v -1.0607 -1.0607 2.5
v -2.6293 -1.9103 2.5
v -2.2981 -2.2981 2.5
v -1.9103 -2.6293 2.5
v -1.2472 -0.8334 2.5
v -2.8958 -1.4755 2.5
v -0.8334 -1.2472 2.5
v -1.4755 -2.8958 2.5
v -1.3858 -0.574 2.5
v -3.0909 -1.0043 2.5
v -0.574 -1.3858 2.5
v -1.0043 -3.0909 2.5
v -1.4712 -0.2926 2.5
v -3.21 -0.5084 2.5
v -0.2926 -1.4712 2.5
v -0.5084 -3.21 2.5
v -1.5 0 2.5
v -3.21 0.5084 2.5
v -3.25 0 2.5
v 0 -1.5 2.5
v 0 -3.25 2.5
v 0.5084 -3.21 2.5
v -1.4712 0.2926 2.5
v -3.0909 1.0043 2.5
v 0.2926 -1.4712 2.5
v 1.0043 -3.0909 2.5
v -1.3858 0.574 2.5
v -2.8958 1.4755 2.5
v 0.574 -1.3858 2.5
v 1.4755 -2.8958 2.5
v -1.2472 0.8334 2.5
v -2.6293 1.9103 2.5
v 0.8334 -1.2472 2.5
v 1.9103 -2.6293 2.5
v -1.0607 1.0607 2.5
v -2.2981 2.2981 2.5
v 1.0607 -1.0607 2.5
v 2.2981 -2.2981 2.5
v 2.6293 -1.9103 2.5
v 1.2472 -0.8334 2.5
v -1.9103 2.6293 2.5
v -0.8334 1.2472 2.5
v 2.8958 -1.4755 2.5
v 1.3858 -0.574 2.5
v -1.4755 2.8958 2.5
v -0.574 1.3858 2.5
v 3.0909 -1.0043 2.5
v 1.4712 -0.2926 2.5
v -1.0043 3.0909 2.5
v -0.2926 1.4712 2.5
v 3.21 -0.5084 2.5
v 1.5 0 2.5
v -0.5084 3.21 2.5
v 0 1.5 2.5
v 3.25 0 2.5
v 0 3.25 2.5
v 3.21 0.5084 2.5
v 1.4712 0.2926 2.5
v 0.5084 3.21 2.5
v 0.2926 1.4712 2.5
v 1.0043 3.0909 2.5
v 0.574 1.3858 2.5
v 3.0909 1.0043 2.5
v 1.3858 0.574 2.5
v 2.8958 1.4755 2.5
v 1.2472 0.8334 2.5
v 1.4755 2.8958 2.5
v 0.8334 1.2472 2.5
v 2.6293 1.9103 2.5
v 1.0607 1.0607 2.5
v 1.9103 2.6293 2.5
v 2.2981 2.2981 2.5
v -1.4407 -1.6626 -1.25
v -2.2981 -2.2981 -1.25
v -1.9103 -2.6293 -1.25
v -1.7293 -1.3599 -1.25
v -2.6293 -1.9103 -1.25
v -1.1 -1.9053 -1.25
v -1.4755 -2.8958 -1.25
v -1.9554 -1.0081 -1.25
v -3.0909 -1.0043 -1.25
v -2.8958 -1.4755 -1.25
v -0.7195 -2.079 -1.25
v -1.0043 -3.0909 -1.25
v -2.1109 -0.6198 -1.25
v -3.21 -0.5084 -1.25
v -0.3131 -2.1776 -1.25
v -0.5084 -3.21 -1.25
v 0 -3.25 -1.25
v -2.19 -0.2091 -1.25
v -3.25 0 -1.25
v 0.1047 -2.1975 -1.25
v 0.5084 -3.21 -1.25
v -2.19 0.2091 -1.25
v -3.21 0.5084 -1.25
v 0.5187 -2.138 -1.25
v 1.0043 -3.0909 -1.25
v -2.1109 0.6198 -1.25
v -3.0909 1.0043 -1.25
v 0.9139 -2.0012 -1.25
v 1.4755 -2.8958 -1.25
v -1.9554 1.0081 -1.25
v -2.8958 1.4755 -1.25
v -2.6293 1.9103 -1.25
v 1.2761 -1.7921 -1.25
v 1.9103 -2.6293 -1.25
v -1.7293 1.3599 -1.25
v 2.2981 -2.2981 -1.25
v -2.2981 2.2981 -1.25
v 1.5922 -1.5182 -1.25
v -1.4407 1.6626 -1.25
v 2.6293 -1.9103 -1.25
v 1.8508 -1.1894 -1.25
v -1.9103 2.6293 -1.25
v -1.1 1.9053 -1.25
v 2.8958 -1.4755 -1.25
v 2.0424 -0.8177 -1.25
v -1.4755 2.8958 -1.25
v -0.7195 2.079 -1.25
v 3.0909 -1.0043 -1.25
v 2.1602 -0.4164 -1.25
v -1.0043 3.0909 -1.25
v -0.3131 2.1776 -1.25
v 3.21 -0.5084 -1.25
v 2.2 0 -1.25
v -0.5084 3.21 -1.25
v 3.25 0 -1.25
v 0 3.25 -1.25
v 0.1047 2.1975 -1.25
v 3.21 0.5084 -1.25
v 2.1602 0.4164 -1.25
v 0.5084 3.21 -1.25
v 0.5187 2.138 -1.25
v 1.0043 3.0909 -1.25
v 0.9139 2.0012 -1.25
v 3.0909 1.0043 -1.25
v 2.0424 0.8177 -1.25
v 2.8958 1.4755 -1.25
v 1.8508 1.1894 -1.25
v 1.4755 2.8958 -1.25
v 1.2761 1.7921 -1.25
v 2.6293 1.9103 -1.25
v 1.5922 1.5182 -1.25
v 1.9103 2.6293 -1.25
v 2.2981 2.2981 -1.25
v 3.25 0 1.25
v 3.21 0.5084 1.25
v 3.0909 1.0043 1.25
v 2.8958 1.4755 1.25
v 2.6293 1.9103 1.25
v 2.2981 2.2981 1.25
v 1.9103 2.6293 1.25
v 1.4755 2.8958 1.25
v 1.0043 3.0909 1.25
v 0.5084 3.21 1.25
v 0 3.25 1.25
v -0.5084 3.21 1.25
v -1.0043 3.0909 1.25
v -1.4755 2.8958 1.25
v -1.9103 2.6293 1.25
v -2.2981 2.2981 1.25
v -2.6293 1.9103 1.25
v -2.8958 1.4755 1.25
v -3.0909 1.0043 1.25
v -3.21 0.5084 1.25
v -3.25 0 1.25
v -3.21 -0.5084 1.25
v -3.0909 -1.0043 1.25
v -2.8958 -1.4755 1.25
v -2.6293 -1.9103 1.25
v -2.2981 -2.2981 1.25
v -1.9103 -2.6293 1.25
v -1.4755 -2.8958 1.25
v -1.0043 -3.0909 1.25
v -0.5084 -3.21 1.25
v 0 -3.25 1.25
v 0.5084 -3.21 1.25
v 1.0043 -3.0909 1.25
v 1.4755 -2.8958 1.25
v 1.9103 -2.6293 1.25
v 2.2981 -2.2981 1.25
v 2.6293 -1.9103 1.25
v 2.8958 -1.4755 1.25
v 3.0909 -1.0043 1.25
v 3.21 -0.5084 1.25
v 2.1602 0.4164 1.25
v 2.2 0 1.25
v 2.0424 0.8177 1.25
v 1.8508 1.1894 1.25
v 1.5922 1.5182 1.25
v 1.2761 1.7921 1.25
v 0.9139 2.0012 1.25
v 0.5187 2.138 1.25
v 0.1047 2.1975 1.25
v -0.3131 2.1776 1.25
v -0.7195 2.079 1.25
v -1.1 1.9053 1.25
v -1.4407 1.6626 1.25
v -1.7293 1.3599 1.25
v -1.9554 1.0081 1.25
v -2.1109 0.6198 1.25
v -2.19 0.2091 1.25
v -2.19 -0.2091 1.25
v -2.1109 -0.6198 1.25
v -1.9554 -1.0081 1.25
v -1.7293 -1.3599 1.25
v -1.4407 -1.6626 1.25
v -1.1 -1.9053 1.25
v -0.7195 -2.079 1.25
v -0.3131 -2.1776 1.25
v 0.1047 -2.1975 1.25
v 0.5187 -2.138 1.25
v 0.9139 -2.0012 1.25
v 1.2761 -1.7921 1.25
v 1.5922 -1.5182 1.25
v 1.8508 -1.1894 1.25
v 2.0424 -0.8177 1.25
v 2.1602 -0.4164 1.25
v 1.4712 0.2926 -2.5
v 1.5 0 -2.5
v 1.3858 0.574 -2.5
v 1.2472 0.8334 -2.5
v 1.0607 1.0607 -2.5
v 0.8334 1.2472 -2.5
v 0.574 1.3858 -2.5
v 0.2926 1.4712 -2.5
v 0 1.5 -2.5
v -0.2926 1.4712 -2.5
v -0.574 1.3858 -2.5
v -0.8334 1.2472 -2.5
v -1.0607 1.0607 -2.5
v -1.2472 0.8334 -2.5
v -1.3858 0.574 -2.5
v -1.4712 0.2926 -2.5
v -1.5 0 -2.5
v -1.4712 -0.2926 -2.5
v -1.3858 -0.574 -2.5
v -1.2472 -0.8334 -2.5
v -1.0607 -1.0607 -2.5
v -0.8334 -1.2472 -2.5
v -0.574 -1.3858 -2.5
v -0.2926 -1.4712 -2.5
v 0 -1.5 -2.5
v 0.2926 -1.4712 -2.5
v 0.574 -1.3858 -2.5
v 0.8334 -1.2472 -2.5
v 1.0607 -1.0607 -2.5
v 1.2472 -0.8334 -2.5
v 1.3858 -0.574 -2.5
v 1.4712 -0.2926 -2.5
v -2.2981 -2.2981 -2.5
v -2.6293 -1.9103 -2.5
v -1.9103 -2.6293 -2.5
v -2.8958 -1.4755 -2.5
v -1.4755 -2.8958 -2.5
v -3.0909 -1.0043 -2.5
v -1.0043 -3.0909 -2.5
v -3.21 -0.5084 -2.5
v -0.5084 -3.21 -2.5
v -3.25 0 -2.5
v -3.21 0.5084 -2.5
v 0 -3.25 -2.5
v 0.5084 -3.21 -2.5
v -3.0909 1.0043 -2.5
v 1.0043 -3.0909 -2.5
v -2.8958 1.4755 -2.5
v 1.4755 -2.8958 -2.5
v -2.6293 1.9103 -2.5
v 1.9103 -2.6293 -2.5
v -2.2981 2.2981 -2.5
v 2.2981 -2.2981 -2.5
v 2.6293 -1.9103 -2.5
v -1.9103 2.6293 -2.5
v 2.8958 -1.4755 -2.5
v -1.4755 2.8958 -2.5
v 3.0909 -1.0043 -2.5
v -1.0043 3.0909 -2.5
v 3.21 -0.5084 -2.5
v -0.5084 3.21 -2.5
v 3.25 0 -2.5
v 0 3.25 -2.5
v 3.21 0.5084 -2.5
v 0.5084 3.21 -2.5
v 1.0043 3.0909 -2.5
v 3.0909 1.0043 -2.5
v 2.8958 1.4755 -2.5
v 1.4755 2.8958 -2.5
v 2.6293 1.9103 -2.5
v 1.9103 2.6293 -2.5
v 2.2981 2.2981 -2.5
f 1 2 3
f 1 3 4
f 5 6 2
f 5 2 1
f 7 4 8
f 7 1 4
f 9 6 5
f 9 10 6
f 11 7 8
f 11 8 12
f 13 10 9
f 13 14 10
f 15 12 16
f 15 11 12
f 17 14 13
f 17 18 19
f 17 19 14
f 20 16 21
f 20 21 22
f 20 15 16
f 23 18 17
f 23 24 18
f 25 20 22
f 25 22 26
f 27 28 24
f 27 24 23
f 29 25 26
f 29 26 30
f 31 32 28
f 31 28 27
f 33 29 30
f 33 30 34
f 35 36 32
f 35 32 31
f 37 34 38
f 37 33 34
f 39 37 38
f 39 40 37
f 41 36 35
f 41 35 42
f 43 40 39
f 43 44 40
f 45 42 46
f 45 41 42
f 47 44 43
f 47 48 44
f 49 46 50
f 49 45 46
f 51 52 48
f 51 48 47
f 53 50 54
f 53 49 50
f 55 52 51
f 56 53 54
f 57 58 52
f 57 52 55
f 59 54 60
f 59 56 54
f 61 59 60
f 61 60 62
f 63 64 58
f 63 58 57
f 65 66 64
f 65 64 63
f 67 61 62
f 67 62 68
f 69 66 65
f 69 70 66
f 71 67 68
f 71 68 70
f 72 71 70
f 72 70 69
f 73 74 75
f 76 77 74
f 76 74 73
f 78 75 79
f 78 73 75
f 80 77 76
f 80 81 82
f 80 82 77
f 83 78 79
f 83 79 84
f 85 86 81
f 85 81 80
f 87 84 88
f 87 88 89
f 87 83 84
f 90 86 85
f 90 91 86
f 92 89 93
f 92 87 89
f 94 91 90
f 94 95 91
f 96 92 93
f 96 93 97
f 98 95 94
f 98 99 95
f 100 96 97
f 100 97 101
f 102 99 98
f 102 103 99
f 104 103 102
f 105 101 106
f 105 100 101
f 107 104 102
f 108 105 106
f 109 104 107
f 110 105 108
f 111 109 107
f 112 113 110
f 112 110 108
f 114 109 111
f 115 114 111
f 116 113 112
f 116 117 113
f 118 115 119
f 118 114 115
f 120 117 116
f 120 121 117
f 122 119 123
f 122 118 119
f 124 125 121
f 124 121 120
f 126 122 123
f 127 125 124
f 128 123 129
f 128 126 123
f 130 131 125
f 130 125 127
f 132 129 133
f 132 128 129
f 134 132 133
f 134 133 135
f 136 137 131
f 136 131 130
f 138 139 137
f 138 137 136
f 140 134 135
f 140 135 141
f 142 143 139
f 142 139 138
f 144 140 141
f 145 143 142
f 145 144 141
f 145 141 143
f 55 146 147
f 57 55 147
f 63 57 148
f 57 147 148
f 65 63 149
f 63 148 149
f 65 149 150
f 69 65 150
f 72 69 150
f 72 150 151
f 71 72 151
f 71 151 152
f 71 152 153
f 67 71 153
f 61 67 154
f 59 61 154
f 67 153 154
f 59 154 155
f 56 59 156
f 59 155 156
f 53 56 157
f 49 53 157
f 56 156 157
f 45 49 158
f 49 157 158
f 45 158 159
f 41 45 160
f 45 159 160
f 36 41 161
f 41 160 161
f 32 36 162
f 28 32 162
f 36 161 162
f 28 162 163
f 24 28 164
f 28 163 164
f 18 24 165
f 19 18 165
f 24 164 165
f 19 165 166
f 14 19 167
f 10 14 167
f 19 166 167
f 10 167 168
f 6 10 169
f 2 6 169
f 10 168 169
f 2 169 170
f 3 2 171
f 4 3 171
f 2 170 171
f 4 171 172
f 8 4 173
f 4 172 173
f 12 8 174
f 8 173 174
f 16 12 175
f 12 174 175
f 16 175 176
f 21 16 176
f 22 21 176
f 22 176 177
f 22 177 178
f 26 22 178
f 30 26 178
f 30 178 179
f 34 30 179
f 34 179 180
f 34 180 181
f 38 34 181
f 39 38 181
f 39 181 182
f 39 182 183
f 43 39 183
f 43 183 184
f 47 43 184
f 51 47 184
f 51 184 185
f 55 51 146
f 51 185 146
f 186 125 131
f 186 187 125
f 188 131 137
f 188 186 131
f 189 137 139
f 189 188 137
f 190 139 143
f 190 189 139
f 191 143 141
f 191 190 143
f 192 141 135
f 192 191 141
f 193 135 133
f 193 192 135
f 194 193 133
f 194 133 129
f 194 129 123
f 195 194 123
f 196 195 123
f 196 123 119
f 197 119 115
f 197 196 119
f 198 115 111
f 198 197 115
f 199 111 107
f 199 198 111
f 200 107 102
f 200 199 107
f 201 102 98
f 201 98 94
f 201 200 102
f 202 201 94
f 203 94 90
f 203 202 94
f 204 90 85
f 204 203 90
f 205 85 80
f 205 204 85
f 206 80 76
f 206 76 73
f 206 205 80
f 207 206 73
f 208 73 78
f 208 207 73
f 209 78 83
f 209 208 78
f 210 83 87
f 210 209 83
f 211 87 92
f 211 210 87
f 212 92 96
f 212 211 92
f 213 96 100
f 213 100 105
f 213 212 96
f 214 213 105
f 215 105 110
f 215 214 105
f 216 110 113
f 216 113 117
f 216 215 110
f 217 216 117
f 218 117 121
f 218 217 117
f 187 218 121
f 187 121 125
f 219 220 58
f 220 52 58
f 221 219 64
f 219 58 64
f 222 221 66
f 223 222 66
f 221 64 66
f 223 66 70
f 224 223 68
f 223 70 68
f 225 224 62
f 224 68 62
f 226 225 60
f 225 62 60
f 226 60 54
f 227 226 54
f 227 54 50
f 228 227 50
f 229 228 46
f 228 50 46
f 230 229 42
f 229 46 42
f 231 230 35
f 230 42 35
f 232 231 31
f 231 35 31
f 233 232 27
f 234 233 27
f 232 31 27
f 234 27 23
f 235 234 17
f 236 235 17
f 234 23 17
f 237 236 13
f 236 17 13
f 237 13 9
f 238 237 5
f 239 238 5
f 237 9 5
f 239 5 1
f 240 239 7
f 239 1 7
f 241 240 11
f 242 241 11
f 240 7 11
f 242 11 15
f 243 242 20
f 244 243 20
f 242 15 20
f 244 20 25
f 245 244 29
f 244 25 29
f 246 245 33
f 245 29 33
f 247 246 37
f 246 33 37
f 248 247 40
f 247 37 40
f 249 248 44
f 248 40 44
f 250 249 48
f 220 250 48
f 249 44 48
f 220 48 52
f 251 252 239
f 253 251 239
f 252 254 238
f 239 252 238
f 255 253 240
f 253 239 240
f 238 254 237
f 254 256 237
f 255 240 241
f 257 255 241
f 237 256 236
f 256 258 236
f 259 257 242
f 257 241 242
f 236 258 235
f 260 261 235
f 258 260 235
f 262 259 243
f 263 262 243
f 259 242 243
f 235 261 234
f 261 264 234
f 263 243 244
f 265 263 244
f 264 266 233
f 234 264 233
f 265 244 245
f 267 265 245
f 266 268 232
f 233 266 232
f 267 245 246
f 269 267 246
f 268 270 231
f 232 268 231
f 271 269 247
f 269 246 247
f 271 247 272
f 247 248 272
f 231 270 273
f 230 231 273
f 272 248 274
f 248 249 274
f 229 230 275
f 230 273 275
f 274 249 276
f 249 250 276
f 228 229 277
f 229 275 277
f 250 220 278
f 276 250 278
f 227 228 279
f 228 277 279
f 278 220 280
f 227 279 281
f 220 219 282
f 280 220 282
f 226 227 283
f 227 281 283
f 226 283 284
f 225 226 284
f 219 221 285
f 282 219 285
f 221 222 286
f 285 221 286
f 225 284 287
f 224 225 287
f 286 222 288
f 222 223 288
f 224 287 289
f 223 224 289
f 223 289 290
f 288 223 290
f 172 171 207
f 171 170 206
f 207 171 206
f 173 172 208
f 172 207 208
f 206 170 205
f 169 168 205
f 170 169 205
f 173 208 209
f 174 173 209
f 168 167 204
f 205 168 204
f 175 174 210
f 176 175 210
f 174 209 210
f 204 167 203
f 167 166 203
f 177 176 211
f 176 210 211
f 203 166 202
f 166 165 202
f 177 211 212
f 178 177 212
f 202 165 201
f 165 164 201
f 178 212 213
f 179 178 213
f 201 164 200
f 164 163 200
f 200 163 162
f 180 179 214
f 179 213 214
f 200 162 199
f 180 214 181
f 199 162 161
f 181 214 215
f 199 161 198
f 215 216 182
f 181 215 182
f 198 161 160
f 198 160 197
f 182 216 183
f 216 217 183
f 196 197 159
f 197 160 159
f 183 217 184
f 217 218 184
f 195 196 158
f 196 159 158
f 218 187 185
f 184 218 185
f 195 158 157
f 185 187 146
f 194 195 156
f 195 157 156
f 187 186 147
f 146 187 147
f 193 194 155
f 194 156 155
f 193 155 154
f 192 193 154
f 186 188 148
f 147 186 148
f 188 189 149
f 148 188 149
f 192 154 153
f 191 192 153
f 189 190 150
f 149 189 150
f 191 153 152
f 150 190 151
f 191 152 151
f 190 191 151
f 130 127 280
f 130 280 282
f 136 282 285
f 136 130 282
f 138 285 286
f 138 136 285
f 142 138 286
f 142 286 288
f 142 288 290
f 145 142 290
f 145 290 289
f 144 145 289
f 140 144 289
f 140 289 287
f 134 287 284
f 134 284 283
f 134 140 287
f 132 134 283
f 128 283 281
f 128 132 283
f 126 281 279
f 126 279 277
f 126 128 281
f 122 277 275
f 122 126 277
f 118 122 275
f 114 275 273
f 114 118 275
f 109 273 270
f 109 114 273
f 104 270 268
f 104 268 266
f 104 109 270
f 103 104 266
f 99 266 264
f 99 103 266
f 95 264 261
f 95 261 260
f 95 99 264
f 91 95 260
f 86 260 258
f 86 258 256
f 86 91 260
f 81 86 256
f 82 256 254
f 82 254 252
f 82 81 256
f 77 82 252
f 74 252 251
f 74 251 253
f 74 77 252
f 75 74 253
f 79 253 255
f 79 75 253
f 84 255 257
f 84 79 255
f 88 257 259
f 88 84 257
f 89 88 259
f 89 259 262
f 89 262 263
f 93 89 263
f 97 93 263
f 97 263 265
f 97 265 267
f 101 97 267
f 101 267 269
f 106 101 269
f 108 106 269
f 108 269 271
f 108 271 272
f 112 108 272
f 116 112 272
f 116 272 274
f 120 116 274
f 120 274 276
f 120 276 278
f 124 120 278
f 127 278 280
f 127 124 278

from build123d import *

# Parameters (mm, degrees)
F0_R     = 2.2
F0_R_2   = 1.5
F1_DEPTH = 1.25
F2_R     = 3.25
F2_R_2   = 1.5
F3_DEPTH = 1.25


with BuildPart() as f1:
    # F0 (on Top) → F1 (new body)
    with BuildSketch(Plane.XY):
        Circle(F0_R)
        Circle(F0_R_2, mode=Mode.SUBTRACT)
    extrude(amount=F1_DEPTH)

    # F2 (on face) → F3 (join)
    with BuildSketch(Plane.XY.offset(1.25)):
        Circle(F2_R)
        Circle(F2_R_2, mode=Mode.SUBTRACT)
    extrude(amount=F3_DEPTH)

    # F4: F1 across plane


with BuildPart() as f1_1:
    add(f1.part)
    add(f1.part.mirror(Plane.XY))


solid = f1_1.part
